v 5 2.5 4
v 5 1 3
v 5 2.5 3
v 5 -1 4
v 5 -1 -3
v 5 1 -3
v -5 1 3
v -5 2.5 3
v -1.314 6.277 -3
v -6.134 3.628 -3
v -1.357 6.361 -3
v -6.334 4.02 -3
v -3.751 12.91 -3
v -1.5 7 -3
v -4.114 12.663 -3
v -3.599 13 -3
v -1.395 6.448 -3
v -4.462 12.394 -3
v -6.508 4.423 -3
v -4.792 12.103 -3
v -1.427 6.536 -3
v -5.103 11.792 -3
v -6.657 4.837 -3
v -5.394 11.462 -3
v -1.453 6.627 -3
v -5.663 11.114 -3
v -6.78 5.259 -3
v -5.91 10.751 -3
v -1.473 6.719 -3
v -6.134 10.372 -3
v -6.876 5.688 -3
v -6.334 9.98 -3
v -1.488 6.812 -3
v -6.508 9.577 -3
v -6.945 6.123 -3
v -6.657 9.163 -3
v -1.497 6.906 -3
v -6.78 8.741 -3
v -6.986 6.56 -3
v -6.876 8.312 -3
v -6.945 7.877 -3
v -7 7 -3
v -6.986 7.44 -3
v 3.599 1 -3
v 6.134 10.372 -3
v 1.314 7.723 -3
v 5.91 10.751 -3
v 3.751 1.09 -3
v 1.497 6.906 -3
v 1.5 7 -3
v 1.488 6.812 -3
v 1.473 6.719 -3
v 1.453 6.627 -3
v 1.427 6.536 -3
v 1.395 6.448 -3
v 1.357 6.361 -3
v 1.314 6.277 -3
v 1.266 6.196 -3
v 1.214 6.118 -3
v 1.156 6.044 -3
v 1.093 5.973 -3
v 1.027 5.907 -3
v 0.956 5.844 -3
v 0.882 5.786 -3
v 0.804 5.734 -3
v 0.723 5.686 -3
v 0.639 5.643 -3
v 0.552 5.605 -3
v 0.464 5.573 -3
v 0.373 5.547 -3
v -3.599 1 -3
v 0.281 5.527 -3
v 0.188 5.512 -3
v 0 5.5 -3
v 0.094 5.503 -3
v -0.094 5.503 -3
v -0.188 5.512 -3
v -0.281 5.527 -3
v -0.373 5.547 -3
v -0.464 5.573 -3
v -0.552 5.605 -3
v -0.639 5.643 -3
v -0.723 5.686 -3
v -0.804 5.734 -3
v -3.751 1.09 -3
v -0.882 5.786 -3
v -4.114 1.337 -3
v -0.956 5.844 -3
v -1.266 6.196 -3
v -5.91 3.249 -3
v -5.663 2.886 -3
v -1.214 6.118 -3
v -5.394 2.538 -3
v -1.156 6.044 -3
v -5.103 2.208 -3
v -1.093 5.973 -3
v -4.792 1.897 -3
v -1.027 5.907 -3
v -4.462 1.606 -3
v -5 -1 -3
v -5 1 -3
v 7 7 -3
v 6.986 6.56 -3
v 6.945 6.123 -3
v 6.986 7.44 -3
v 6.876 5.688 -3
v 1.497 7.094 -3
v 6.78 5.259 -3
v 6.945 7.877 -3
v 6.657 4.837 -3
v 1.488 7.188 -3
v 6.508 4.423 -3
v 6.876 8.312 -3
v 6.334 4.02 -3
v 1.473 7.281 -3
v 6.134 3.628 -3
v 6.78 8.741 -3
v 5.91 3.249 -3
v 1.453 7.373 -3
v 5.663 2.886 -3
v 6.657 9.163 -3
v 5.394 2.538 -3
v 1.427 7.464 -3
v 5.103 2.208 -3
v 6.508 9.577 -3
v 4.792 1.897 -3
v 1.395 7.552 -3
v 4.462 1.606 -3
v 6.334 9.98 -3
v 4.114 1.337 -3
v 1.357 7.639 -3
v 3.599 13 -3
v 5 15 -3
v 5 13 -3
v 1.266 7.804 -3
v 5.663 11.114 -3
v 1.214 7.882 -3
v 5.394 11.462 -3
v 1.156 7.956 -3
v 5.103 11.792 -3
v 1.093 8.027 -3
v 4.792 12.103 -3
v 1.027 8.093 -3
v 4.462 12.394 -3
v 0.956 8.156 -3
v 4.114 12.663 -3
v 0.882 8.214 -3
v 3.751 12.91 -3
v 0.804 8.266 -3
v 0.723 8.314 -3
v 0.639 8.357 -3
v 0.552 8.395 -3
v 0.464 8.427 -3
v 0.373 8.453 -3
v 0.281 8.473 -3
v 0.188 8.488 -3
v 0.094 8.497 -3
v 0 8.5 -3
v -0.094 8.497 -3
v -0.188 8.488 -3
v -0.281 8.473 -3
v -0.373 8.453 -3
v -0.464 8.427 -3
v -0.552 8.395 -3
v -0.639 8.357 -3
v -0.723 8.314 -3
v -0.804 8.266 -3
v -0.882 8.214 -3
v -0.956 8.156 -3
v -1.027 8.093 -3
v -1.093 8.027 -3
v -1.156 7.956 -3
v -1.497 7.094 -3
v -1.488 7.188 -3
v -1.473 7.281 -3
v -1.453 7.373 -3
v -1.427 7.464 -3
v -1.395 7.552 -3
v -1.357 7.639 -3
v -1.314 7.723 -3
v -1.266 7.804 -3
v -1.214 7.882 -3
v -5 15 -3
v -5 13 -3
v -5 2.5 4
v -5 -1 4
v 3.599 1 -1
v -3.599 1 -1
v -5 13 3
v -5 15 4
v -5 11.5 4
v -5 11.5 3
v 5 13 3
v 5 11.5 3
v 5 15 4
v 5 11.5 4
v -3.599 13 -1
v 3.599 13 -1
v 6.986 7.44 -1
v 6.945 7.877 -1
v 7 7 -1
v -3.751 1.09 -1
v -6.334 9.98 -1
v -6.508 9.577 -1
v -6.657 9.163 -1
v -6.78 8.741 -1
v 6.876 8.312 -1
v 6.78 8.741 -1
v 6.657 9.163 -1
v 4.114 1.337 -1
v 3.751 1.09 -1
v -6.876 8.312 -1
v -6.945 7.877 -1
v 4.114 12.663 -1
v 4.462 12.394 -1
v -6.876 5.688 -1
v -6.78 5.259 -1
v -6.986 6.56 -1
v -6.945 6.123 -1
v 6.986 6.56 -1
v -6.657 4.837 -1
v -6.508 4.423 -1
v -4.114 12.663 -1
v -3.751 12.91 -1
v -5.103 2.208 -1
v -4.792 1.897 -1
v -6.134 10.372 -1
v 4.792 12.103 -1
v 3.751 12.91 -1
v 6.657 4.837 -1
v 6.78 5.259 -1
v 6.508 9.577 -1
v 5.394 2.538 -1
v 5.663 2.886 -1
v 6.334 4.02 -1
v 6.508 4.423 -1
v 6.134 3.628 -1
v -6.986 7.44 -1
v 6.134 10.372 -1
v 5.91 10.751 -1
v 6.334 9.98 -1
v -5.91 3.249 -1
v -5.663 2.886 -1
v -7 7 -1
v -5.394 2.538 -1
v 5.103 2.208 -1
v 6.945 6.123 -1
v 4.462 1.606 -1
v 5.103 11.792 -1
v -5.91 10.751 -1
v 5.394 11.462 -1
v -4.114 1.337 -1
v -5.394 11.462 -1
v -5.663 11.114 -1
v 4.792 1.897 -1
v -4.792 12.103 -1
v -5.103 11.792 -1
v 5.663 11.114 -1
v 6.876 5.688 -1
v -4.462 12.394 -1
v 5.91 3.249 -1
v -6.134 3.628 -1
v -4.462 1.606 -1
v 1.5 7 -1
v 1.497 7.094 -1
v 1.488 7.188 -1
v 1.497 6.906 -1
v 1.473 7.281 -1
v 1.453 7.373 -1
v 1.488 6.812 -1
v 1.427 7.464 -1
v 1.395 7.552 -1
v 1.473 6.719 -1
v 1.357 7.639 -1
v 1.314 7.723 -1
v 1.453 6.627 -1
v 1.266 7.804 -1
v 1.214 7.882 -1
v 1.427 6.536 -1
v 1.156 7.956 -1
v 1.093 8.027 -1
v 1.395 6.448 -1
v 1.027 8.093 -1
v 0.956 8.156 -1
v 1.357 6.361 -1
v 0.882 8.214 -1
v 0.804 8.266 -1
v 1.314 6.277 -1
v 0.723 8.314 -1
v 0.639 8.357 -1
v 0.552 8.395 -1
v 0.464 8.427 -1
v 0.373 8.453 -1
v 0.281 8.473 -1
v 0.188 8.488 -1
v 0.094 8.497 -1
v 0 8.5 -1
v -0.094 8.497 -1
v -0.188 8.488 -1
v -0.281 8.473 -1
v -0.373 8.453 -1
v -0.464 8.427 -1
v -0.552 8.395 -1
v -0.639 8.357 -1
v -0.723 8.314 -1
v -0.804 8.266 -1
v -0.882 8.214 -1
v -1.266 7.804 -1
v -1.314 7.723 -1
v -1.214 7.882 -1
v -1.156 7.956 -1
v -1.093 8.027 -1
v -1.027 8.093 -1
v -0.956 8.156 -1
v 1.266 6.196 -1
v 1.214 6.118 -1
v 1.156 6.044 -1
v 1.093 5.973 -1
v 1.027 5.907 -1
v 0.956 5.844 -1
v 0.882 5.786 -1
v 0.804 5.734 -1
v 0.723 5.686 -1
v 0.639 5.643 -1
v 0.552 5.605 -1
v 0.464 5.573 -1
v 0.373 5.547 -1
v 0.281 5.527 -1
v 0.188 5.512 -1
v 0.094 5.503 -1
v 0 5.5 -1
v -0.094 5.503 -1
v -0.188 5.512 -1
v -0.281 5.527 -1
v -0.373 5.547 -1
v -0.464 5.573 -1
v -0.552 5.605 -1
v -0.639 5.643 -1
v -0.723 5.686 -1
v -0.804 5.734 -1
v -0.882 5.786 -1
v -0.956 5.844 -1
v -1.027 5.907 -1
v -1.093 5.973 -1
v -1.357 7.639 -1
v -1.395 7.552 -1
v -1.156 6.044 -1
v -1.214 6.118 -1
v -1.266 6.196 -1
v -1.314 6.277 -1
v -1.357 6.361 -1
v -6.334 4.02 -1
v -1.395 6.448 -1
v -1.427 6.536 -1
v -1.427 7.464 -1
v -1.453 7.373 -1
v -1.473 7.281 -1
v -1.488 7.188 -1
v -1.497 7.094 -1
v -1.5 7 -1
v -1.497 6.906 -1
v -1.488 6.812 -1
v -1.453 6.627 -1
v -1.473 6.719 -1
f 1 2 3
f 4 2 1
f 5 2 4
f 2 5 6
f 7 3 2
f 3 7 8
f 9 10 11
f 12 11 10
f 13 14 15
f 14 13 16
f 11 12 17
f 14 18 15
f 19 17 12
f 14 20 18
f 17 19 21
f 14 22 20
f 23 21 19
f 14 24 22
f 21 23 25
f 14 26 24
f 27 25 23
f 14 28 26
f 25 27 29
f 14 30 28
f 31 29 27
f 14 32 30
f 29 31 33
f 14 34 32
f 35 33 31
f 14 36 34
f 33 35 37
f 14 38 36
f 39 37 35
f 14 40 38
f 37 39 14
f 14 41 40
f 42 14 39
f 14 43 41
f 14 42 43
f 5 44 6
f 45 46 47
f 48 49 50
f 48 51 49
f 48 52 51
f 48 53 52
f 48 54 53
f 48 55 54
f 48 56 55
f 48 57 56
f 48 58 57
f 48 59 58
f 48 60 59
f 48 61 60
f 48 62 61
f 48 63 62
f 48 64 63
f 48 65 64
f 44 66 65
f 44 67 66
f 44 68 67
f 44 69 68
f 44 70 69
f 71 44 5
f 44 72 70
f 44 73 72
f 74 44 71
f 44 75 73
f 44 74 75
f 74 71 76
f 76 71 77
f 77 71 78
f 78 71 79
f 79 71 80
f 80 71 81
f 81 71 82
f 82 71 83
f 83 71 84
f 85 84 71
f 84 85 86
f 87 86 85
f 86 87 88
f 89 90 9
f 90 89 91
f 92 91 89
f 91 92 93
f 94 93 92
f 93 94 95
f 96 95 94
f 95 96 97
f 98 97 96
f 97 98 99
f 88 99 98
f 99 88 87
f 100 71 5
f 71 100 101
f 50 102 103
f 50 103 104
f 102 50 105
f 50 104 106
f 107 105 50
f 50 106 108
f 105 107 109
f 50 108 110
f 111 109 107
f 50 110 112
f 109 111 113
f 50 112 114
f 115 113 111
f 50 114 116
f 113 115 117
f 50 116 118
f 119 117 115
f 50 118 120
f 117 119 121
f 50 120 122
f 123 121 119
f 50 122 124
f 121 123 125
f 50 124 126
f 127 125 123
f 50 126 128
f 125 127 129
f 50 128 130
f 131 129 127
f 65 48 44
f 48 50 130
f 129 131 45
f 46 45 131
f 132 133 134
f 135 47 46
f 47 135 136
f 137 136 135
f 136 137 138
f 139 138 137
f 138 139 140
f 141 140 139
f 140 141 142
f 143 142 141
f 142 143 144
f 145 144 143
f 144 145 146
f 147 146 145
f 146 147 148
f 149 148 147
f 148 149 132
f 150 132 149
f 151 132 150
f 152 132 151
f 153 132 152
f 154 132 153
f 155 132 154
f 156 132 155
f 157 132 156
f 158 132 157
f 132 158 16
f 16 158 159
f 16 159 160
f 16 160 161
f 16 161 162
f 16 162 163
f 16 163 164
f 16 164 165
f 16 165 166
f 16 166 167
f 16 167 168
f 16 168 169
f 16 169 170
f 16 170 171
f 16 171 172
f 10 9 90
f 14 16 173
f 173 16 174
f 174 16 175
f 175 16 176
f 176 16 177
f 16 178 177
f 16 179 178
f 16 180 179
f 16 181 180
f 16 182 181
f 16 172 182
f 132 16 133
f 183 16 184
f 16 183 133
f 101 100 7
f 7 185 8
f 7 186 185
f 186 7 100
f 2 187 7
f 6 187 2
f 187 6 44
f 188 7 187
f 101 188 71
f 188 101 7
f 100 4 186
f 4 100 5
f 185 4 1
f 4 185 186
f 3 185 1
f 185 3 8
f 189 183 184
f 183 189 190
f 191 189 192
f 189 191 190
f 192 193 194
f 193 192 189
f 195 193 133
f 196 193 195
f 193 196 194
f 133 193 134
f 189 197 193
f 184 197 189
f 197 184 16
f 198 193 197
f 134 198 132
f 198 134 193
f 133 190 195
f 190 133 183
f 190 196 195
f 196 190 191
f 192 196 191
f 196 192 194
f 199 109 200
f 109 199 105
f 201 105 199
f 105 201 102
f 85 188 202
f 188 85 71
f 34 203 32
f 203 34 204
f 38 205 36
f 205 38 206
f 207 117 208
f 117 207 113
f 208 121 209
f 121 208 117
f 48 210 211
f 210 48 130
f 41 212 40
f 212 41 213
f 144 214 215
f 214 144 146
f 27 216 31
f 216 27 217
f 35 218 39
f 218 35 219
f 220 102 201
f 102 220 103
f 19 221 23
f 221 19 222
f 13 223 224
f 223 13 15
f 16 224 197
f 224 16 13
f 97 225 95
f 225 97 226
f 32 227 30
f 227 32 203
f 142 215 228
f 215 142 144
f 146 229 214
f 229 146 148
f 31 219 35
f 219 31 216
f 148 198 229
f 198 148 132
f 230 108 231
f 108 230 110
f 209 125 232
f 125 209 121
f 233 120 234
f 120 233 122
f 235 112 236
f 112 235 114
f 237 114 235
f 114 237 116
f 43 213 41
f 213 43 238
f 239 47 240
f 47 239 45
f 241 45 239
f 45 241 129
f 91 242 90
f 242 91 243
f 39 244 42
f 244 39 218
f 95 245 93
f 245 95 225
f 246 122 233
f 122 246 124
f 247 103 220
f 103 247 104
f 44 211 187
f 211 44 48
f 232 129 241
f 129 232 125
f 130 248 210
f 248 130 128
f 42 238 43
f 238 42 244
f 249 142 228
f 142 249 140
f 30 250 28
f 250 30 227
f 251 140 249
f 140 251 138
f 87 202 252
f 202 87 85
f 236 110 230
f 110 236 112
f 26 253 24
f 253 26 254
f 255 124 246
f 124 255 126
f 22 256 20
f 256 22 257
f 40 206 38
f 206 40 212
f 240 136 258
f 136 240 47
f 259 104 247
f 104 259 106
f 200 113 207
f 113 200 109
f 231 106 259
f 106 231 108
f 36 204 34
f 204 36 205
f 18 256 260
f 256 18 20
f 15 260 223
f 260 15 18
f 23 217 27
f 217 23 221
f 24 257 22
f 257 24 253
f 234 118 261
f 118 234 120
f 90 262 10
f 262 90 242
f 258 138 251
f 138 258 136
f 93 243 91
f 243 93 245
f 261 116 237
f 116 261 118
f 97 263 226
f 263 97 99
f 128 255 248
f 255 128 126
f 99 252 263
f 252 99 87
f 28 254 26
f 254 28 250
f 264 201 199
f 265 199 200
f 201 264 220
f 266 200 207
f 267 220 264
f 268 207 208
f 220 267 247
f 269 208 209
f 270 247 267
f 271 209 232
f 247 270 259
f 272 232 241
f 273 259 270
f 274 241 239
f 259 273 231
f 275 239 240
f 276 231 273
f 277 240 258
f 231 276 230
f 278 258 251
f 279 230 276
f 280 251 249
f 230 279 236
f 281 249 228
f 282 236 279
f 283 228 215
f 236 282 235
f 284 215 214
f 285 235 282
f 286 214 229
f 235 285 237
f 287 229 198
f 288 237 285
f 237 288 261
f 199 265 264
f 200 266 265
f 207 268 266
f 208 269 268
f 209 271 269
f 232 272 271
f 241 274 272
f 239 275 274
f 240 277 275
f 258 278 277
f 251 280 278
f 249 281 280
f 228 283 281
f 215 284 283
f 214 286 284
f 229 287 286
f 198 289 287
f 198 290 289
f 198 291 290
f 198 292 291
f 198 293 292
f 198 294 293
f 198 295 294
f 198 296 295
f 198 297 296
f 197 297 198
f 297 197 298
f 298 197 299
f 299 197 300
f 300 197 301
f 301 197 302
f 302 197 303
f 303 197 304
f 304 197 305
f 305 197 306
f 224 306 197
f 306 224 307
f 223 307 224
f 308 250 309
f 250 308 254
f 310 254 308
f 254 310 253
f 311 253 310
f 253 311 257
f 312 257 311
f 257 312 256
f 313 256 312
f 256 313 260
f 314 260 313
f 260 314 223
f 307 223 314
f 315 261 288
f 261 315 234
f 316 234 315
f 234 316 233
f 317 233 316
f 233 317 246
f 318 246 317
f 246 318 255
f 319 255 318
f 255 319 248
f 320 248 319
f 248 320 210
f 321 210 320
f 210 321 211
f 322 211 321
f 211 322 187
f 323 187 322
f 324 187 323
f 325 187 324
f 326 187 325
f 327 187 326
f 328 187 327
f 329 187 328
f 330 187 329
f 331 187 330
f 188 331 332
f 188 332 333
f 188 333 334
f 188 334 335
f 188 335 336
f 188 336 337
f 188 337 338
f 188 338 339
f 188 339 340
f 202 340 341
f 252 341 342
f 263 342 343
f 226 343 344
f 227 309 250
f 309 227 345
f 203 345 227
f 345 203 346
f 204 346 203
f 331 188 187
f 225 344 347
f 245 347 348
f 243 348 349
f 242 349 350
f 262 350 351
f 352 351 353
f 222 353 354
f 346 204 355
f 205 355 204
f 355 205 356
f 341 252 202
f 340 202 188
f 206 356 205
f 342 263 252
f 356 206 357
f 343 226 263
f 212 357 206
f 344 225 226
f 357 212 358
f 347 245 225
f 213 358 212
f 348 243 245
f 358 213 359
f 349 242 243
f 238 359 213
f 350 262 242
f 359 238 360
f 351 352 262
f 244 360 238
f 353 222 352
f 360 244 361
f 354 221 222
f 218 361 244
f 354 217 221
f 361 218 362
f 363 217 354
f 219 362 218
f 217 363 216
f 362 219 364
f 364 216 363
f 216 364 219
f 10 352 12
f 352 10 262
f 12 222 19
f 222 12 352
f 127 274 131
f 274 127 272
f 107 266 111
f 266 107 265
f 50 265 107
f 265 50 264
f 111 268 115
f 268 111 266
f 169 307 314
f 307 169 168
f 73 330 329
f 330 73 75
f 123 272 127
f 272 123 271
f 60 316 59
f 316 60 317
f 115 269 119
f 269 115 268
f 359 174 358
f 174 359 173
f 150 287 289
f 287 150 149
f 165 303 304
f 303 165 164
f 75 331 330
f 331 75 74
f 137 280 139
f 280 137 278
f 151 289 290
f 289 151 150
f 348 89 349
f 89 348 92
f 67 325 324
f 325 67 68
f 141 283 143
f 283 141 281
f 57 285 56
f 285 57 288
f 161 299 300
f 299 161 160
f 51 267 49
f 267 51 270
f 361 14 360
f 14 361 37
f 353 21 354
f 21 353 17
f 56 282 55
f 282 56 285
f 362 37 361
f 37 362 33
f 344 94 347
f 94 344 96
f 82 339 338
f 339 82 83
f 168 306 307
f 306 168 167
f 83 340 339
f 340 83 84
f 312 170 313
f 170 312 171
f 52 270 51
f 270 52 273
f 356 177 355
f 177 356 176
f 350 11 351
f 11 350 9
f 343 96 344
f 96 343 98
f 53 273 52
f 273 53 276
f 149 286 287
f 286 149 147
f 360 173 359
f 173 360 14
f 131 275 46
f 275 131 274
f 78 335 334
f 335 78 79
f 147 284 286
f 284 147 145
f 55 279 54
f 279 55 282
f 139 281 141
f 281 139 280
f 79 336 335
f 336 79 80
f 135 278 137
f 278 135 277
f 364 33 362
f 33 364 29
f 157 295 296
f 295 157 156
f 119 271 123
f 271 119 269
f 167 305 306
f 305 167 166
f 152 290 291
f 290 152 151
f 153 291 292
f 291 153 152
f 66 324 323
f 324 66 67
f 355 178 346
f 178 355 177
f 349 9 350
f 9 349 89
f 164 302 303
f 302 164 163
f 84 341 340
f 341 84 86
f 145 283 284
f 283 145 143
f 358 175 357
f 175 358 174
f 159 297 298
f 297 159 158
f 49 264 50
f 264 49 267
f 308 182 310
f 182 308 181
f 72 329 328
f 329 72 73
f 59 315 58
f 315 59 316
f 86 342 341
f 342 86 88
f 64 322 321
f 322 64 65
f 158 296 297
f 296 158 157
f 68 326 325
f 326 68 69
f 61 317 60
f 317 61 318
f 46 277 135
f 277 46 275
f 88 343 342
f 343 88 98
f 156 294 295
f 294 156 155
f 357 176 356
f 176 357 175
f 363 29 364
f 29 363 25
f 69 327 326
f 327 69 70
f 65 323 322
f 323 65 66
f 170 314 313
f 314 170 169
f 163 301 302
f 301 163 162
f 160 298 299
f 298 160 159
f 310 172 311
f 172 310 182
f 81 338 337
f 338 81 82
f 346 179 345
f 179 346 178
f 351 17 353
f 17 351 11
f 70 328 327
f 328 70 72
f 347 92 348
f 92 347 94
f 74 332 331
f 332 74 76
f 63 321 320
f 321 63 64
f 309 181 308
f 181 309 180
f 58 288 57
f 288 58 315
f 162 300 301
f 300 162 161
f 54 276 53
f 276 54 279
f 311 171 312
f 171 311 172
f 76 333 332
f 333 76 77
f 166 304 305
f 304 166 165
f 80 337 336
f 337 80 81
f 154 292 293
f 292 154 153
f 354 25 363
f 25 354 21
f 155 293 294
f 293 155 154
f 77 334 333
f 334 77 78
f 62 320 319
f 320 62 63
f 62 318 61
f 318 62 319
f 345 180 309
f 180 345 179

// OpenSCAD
smooth = 100;

strip_width = 12;
strip_thickness = 4;

arm_width = 10;
arm_thickness = 2;
arm_height = strip_thickness + 2;

grip_width = 10;
grip_thickness = arm_thickness + 1.5;
grip_height = 1;

module arm() {
    cube([arm_width,arm_thickness,arm_height], center=true);
    translate([0,(grip_thickness/2)-1,(arm_height/2)+0.5]) 
        cube([grip_width,grip_thickness,grip_height], center=true);
}

module diffuser() {
    difference() {
        cylinder(h=2, r1=7, r2=7, $fn=smooth);
        translate([0,0,-1]) cylinder(h=4, r1=1.5, r2=1.5, $fn=smooth);
    }
}

module all() {
    arm();
    translate([0,14,0]) rotate([0,0,180]) arm();
    translate([0,7,-3]) diffuser();
}

all();
//translate([0,0,10]) all();
